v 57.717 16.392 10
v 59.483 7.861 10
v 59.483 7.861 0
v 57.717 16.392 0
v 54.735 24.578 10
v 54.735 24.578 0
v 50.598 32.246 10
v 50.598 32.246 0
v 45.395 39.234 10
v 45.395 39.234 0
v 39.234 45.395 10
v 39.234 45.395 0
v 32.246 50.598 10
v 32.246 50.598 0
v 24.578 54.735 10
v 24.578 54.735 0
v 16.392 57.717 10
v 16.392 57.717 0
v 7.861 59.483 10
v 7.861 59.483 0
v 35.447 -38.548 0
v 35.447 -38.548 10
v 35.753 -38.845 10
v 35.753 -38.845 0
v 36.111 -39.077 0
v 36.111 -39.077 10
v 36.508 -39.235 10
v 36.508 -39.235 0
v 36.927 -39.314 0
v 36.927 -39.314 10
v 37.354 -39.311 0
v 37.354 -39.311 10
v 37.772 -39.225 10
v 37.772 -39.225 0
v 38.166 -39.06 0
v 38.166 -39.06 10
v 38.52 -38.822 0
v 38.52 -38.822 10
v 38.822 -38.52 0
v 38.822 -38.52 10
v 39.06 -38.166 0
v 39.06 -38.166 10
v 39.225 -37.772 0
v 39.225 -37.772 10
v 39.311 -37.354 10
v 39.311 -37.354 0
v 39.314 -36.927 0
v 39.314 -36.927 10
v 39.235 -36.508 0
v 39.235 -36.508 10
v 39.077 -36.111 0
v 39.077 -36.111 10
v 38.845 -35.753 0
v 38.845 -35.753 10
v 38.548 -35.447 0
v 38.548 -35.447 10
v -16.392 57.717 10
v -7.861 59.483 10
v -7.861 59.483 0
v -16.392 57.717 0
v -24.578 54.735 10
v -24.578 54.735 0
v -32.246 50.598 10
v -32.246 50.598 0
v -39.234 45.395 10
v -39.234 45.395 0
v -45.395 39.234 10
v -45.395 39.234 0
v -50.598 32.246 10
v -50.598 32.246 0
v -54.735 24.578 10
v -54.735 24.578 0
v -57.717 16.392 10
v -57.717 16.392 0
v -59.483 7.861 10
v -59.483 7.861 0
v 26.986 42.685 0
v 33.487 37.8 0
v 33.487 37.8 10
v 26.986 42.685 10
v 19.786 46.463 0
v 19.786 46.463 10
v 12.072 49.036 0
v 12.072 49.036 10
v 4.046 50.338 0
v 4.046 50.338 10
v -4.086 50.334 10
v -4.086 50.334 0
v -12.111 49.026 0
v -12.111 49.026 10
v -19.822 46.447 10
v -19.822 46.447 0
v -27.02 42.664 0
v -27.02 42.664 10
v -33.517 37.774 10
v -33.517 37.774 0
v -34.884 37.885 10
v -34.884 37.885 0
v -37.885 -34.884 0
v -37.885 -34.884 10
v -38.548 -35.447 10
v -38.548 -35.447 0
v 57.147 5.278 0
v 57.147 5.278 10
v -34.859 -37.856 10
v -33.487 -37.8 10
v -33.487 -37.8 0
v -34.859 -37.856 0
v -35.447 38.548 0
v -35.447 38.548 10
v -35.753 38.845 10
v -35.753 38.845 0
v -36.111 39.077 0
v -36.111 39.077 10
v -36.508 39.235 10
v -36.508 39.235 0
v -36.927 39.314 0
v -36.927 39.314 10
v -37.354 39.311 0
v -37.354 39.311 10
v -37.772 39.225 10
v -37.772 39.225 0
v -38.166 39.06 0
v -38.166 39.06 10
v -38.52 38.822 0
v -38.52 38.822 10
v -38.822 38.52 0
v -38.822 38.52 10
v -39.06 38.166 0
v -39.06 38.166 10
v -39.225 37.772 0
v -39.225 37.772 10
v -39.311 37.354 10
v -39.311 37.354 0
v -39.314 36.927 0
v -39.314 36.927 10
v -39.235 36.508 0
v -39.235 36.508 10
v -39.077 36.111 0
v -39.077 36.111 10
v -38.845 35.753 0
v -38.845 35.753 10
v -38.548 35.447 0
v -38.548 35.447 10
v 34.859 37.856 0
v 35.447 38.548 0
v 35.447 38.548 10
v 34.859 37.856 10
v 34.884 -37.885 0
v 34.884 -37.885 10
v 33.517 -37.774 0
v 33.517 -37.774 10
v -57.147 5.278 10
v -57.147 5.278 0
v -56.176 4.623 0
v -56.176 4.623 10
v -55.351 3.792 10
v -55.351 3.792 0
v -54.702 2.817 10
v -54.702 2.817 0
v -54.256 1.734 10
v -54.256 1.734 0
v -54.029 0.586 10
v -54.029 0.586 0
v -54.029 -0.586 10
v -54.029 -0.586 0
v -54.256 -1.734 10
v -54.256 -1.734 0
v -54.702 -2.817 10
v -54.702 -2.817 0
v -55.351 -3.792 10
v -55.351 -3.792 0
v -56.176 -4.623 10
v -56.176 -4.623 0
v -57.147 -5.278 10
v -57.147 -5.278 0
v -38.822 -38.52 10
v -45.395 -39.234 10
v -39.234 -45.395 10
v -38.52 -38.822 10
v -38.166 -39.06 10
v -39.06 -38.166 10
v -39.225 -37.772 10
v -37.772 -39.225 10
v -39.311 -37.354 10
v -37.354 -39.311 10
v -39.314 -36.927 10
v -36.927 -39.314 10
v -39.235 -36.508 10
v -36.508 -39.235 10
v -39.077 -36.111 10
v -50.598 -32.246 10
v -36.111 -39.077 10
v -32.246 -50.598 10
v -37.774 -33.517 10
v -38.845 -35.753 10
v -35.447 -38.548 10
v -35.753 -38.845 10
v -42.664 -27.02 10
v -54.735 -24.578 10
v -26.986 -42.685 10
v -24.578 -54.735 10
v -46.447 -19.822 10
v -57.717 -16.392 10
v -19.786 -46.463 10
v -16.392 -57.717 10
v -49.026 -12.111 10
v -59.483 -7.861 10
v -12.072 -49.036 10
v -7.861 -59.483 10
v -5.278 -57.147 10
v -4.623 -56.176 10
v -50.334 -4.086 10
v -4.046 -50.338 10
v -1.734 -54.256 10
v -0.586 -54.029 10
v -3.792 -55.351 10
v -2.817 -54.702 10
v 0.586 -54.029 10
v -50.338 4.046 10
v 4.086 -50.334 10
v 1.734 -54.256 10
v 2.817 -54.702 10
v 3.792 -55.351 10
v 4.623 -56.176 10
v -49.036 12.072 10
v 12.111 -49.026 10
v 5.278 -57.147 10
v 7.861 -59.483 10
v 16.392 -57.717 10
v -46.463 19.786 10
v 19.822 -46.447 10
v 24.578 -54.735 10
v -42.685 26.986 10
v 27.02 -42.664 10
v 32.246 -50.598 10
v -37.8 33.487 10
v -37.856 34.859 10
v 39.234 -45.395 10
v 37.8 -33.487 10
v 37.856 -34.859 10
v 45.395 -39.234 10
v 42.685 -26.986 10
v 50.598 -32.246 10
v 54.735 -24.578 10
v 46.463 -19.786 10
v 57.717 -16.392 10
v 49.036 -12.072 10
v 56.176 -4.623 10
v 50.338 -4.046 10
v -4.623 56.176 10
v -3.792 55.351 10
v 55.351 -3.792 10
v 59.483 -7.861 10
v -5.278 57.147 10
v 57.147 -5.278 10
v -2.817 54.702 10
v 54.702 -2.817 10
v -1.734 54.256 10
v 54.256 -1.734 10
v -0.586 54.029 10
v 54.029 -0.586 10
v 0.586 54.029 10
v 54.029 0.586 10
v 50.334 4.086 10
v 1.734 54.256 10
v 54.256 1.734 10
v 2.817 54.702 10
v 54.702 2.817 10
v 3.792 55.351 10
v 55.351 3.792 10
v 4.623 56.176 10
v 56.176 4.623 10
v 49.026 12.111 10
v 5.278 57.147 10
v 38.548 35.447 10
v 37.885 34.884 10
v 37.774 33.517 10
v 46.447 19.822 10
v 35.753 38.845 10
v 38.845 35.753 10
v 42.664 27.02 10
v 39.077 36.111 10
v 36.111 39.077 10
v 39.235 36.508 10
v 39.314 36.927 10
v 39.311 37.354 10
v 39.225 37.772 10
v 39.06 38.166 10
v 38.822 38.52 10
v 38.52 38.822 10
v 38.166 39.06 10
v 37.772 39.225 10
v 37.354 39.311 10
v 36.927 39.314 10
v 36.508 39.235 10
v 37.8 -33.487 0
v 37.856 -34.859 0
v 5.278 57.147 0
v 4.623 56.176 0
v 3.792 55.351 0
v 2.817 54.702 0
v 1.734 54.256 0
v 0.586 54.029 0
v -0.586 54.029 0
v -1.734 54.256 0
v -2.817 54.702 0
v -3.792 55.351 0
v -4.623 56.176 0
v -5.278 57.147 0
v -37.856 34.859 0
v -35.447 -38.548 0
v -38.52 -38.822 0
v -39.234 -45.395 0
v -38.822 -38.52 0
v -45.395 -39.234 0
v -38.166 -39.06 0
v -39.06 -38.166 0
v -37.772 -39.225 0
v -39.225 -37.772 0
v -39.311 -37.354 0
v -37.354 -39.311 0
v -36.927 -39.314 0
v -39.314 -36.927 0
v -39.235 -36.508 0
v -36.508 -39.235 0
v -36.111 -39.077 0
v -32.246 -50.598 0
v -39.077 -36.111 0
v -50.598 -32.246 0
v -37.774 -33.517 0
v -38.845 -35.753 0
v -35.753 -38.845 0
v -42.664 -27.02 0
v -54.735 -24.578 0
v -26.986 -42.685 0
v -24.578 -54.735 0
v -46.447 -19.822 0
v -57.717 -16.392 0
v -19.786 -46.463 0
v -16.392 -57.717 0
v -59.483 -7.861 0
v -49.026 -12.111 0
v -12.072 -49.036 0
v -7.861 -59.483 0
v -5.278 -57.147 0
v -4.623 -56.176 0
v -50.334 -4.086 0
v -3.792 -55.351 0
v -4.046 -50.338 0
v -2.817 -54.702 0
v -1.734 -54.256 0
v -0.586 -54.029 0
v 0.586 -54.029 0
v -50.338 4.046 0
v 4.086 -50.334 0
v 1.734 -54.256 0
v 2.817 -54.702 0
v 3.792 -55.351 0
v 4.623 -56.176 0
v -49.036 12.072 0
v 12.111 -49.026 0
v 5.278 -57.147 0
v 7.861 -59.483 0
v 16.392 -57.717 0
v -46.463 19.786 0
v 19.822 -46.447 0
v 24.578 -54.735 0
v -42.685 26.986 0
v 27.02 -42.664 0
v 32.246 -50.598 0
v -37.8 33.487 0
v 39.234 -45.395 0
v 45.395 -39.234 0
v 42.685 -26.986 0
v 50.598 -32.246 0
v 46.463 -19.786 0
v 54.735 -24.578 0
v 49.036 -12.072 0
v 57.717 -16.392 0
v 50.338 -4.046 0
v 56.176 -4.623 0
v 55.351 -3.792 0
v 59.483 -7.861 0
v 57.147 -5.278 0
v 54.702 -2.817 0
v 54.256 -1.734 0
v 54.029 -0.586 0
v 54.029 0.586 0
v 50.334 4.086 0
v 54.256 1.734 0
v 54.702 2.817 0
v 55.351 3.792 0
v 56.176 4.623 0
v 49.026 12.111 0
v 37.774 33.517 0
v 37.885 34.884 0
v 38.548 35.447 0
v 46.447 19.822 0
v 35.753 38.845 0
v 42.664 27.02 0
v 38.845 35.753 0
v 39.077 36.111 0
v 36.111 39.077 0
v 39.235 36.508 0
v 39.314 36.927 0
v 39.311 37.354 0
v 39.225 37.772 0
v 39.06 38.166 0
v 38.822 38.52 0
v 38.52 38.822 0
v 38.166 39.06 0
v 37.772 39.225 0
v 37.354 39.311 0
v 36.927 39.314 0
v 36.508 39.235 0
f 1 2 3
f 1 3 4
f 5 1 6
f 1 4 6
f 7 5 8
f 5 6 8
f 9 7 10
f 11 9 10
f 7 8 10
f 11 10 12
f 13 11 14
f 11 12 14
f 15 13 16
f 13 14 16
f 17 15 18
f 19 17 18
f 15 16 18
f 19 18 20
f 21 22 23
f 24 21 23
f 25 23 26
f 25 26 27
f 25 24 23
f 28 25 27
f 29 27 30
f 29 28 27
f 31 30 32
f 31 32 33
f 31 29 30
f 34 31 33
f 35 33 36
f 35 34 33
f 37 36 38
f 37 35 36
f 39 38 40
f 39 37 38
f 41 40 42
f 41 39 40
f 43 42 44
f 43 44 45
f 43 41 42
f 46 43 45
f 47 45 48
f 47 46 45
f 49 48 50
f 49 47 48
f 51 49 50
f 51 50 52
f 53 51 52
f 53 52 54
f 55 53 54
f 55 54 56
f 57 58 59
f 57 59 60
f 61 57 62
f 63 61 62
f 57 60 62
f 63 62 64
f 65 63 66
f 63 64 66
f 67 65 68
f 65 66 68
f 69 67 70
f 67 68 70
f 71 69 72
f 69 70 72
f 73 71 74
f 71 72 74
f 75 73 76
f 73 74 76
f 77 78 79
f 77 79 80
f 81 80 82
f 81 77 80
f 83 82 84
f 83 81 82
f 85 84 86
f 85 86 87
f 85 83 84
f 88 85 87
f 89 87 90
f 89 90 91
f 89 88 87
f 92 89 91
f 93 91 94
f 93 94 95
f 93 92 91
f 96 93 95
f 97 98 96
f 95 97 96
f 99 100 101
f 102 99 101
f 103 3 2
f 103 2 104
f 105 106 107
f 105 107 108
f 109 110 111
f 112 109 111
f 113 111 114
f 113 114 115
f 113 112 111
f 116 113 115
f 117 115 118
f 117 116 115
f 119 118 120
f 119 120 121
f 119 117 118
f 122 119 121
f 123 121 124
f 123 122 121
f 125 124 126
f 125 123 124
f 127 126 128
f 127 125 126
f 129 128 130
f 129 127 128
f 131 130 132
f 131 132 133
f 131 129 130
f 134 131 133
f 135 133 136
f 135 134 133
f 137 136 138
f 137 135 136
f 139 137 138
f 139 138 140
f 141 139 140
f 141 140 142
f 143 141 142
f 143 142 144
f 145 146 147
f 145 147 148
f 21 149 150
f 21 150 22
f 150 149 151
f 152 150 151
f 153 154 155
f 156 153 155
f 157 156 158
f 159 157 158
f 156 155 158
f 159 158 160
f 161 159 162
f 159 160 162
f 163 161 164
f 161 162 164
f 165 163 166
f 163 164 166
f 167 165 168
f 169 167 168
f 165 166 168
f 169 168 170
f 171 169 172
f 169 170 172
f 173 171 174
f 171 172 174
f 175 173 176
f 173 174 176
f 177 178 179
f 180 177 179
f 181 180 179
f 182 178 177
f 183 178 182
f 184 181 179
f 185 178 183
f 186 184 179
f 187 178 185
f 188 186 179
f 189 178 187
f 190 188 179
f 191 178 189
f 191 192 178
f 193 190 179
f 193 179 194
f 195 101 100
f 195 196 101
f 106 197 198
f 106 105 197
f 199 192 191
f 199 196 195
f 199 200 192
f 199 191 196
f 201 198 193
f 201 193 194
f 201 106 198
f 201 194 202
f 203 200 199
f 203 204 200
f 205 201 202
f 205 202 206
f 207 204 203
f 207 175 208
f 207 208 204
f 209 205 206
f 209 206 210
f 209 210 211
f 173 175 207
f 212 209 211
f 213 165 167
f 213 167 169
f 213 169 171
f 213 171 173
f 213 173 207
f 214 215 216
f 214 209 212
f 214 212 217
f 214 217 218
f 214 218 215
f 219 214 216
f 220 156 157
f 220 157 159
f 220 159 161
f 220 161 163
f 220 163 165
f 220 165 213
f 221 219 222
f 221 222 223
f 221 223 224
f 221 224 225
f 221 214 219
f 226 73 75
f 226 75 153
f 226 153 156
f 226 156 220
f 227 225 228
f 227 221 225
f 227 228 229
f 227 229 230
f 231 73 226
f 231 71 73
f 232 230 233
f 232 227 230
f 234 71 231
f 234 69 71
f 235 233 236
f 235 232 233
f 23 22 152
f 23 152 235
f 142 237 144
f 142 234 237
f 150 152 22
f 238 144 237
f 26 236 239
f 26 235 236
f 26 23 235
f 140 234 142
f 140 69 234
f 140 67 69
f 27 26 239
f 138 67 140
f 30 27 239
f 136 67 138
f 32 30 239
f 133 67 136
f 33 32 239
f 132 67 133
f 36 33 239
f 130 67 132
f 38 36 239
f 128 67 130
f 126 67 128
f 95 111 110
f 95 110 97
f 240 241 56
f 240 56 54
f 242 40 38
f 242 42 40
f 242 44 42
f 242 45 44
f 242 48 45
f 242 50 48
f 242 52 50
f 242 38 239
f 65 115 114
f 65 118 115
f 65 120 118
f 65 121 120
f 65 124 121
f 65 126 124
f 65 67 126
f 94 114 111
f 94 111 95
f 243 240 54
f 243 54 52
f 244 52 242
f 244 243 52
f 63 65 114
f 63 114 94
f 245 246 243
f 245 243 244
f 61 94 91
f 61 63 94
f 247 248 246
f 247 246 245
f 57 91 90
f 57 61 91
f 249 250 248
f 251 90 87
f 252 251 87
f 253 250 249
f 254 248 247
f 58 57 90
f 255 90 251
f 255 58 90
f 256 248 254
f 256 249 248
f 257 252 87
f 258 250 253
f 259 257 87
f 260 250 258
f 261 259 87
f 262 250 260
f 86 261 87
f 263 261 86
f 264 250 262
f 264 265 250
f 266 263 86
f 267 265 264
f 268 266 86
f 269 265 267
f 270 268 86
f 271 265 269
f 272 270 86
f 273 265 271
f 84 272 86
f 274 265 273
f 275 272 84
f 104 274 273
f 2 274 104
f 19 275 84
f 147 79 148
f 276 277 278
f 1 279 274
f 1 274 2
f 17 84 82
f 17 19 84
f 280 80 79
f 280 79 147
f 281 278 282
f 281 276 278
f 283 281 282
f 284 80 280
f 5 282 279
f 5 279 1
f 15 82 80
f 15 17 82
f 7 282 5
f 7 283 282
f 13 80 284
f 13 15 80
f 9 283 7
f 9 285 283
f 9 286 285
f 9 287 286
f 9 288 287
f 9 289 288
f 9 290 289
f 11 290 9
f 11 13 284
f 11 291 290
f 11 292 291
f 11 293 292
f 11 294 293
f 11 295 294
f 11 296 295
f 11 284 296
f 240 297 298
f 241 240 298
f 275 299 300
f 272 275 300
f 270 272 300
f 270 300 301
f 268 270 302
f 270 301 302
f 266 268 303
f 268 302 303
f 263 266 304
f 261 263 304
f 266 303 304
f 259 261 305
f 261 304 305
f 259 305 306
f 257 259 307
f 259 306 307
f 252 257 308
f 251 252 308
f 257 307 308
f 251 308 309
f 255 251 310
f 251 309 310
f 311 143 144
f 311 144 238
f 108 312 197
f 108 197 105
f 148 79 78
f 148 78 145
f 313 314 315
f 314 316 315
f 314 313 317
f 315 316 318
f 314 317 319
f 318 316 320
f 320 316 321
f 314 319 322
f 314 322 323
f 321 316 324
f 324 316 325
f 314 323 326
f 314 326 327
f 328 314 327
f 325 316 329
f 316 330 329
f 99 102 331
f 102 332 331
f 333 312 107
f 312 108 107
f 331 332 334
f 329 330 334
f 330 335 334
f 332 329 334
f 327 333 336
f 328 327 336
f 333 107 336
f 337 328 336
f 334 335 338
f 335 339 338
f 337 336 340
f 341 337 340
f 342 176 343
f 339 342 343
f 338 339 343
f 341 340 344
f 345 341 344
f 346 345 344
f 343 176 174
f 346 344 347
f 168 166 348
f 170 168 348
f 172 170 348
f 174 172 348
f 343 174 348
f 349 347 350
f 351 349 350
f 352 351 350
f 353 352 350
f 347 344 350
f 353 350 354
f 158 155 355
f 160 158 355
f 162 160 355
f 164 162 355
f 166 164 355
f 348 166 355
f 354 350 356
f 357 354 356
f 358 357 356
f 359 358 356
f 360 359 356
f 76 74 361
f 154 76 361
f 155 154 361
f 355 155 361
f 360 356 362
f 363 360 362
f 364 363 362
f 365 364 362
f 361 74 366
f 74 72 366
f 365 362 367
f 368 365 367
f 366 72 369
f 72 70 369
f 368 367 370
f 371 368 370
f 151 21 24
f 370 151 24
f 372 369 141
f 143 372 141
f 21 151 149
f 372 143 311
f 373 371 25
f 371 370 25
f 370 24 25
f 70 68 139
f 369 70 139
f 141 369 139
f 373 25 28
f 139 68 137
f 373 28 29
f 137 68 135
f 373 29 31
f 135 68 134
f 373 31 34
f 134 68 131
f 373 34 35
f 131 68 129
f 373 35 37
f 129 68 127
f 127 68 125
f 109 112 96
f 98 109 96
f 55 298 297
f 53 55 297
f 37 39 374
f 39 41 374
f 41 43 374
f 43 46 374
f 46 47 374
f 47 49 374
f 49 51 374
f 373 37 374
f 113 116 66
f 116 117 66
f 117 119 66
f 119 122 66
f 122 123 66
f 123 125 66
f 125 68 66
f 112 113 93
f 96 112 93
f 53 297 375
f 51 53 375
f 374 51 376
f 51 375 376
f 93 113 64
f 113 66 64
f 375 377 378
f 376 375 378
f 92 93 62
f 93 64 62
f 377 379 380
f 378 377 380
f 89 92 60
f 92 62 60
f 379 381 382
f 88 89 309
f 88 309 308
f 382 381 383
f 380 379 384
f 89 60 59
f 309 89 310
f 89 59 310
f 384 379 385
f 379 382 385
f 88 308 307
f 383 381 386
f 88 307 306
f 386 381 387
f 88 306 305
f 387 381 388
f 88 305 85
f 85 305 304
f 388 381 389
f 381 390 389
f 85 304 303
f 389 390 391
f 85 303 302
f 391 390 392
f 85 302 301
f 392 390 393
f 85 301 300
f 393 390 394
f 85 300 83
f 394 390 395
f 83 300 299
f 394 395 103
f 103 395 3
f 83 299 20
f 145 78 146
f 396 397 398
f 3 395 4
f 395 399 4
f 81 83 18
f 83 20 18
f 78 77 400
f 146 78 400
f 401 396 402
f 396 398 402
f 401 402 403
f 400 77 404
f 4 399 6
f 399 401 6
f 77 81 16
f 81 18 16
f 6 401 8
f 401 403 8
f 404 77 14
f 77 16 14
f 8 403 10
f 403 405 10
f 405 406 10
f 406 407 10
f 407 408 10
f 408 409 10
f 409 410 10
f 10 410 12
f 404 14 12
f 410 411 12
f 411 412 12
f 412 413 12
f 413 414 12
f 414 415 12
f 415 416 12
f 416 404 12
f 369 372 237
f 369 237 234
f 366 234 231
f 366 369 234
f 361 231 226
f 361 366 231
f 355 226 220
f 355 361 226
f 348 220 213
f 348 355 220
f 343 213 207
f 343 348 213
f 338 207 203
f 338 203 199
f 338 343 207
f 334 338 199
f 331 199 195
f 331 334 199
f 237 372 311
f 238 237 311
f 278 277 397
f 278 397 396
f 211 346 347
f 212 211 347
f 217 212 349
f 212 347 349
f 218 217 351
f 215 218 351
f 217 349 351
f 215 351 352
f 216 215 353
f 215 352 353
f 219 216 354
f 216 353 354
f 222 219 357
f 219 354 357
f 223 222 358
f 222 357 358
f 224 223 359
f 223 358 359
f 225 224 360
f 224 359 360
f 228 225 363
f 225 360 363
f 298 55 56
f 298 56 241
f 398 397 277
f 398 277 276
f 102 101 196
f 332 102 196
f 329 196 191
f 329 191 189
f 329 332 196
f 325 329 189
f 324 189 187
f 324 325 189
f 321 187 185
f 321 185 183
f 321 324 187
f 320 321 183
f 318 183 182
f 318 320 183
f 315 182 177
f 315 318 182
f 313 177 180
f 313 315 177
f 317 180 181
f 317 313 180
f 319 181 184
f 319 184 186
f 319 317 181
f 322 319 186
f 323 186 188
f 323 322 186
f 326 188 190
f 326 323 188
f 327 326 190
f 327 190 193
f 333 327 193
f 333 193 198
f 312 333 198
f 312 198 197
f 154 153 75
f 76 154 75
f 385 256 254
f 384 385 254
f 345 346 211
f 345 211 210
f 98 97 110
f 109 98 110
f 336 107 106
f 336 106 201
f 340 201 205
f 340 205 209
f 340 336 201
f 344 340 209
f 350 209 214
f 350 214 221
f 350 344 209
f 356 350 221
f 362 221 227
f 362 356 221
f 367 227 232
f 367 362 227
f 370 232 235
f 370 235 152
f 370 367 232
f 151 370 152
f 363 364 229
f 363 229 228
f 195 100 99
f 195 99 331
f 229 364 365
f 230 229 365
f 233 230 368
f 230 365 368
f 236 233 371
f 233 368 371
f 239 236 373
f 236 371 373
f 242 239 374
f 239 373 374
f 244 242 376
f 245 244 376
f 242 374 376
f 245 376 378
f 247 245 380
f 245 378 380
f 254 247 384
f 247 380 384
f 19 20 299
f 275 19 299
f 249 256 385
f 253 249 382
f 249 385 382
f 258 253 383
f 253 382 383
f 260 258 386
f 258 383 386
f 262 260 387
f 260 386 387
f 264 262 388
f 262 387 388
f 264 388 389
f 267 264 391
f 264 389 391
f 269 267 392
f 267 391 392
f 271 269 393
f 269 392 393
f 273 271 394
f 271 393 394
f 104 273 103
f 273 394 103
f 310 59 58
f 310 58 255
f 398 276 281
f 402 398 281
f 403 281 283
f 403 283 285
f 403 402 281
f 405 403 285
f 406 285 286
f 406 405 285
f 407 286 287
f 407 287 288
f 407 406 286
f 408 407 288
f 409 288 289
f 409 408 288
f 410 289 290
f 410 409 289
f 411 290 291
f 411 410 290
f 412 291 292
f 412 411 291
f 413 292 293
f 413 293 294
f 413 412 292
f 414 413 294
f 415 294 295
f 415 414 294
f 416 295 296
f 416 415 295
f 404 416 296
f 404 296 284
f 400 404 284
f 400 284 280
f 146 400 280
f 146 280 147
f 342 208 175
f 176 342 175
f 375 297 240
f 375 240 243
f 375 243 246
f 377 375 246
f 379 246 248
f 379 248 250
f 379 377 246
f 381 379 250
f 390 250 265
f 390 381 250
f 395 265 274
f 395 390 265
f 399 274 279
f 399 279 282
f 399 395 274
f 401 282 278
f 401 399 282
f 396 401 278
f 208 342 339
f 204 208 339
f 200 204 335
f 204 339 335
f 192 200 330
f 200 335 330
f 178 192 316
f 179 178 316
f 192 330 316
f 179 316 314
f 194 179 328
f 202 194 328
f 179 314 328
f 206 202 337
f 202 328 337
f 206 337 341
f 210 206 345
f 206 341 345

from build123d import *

# Parameters (mm, degrees)
SKETCH_1_R          = 60
EXTRUDE_1_DEPTH     = 10
CHAMFER_1_SIZE      = 0.961662122
CHAMFER_1_SIZE_2    = 1
SKETCH_2_R          = 6
CUT_EXTRUDE_1_DEPTH = 10


with BuildPart() as part:
    # 草图1 → 凸台-拉伸1 (new body)
    with BuildSketch(Plane.XY):
        Circle(SKETCH_1_R)
        with BuildLine():
            Line((-38.547540209, 35.446506114), (-37.123106012, 34.236311133))
            ThreePointArc((-37.123106012, 34.236311133), (-50.5, 0), (-37.123106012, -34.236311133))
            Line((-37.123106012, -34.236311133), (-38.547540209, -35.446506114))
            ThreePointArc((-38.547540209, -35.446506114), (-38.678740931, -38.678740931), (-35.446506114, -38.547540209))
            Line((-35.446506114, -38.547540209), (-34.236311133, -37.123106012))
            ThreePointArc((-34.236311133, -37.123106012), (0, -50.5), (34.236311133, -37.123106012))
            Line((34.236311133, -37.123106012), (35.446506114, -38.547540209))
            ThreePointArc((35.446506114, -38.547540209), (38.678740931, -38.678740931), (38.547540209, -35.446506114))
            Line((38.547540209, -35.446506114), (37.123106012, -34.236311133))
            ThreePointArc((37.123106012, -34.236311133), (50.5, 0), (37.123106012, 34.236311133))
            Line((37.123106012, 34.236311133), (38.547540209, 35.446506114))
            ThreePointArc((38.547540209, 35.446506114), (38.678740931, 38.678740931), (35.446506114, 38.547540209))
            Line((35.446506114, 38.547540209), (34.236311133, 37.123106012))
            ThreePointArc((34.236311133, 37.123106012), (0, 50.5), (-34.236311133, 37.123106012))
            Line((-34.236311133, 37.123106012), (-35.446506114, 38.547540209))
            ThreePointArc((-35.446506114, 38.547540209), (-38.678740931, 38.678740931), (-38.547540209, 35.446506114))
        make_face(mode=Mode.SUBTRACT)
    extrude(amount=EXTRUDE_1_DEPTH)

    # 倒角1
    # the kernel refuses this chamfer: 1, 0.961662122 mm, written as the material it takes off along each edge
    with BuildSketch(Plane(origin=(34.236311133, 37.123106012, -2.597741643), x_dir=(-0.7418547410377812, 0.6705606185869901, 0), z_dir=(0, 0, 1)), Plane(origin=(-37.123106012, 34.236311133, -2.597741643), x_dir=(-0.6705606185869967, -0.741854741037775, 0), z_dir=(0, 0, 1)), Plane(origin=(-34.236311133, -37.123106012, -2.597741643), x_dir=(0.7418547410378011, -0.670560618586968, 0), z_dir=(0, 0, 1)), Plane(origin=(37.123106012, -34.236311133, -2.597741643), x_dir=(0.6705606185869861, 0.7418547410377846, 0), z_dir=(0, 0, 1))) as chamfer_1_piece_1:
        with BuildLine():
            Line((1.010153596, 0), (CHAMFER_1_SIZE * 0.0306993646522, -CHAMFER_1_SIZE * 0.999528663409))
            Line((CHAMFER_1_SIZE * 0.0306993646522, -CHAMFER_1_SIZE * 0.999528663409), (0, 0))
            ThreePointArc((0, 0), (0.519364344, -0.00252381), (1.010153596, 0))
        make_face()
    extrude(amount=15.195483286, mode=Mode.SUBTRACT)
    with BuildSketch(Plane(origin=(-34.236311133, 37.123106012, -2.571682988), x_dir=(-0.6474700896278034, 0.7620908627174087, 0), z_dir=(0, 0, 1)), Plane(origin=(-37.123106012, -34.236311133, -2.571682988), x_dir=(-0.7620908627174083, -0.6474700896278041, 0), z_dir=(0, 0, 1)), Plane(origin=(34.236311133, -37.123106012, -2.571682988), x_dir=(0.6474700896277805, -0.7620908627174282, 0), z_dir=(0, 0, 1)), Plane(origin=(37.123106012, 34.236311133, -2.571682988), x_dir=(0.7620908627174152, 0.6474700896277957, 0), z_dir=(0, 0, 1))) as chamfer_1_piece_2:
        with BuildLine():
            Line((CHAMFER_1_SIZE_2, 0), (0.030170276, -0.969829724))
            ThreePointArc((0.030170276, -0.969829724), (0.017838593, -0.498535983), (0, 0))
            Line((0, 0), (CHAMFER_1_SIZE_2, 0))
        make_face()
    extrude(amount=15.143365976, mode=Mode.SUBTRACT)

    # 草图2 → 切除-拉伸1 (cut)
    with BuildSketch(Plane(origin=(0, 0, 0), x_dir=(-1, 0, 0), z_dir=(0, 0, -1))):
        with Locations((60, 0)):
            Circle(SKETCH_2_R)
        with Locations((-60, 0)):
            Circle(SKETCH_2_R)
        with Locations((0, -60)):
            Circle(SKETCH_2_R)
        with Locations((0, 60)):
            Circle(SKETCH_2_R)
    extrude(amount=-CUT_EXTRUDE_1_DEPTH, mode=Mode.SUBTRACT)

    # 倒角2
    # the kernel refuses this chamfer: 2, 1.907033604 mm, written as the material it takes off along each edge
    with BuildSketch(Plane(origin=(-5.992495307, 59.7, 16.798280923), x_dir=(-0.9933125969799259, -0.11545598590369961, 0), z_dir=(0, 0, -1)), Plane(origin=(59.7, 5.992495307, 16.798280923), x_dir=(-0.11545598590369978, 0.9933125969799259, 0), z_dir=(0, 0, -1)), Plane(origin=(5.992495307, -59.7, 16.798280923), x_dir=(0.993312596979926, 0.11545598590369918, 0), z_dir=(0, 0, -1)), Plane(origin=(-59.7, -5.992495307, 16.798280923), x_dir=(0.11545598590370064, -0.9933125969799258, 0), z_dir=(0, 0, -1))) as chamfer_2_piece_1:
        with BuildLine():
            Line((1.880602566, 0), (-0.414776487, -2.618663345))
            ThreePointArc((-0.414776487, -2.618663345), (-0.066481971, -1.366902402), (0, 0))
            ThreePointArc((0, 0), (0.966657818, 0.007362718), (1.880602566, 0))
        make_face()
    extrude(amount=23.596561846, mode=Mode.SUBTRACT)
    with BuildSketch(Plane(origin=(5.992495307, 59.7, 16.798280923), x_dir=(0.9933125969799259, -0.11545598590369989, 0), z_dir=(0, 0, -1))) as chamfer_2_piece_2:
        with BuildLine():
            Line((1.880602566, 0), (-0.414776487, 2.618663345))
            ThreePointArc((-0.414776487, 2.618663345), (-0.066481971, 1.366902402), (0, 0))
            ThreePointArc((0, 0), (0.966657818, -0.007362718), (1.880602566, 0))
        make_face()
    extrude(amount=23.596561846, mode=Mode.SUBTRACT)
    with BuildSketch(Plane(origin=(-5.992495307, -59.7, 16.798280923), x_dir=(0.26943037499341854, 0.9630198715659537, 0), z_dir=(0, 0, -1)), Plane(origin=(59.7, -5.992495307, 16.798280923), x_dir=(-0.963019871565954, 0.26943037499341704, 0), z_dir=(0, 0, -1)), Plane(origin=(-59.7, 5.992495307, 16.798280923), x_dir=(0.9630198715659543, -0.26943037499341643, 0), z_dir=(0, 0, -1))) as chamfer_2_piece_3:
        with BuildLine():
            Line((2.651308592, 0), (-0.294205559, -1.857446931))
            ThreePointArc((-0.294205559, -1.857446931), (-0.158498115, -0.953603635), (0, 0))
            ThreePointArc((0, 0), (1.360472479, -0.148177801), (2.651308592, 0))
        make_face()
    extrude(amount=23.596561846, mode=Mode.SUBTRACT)


solid = part.part
